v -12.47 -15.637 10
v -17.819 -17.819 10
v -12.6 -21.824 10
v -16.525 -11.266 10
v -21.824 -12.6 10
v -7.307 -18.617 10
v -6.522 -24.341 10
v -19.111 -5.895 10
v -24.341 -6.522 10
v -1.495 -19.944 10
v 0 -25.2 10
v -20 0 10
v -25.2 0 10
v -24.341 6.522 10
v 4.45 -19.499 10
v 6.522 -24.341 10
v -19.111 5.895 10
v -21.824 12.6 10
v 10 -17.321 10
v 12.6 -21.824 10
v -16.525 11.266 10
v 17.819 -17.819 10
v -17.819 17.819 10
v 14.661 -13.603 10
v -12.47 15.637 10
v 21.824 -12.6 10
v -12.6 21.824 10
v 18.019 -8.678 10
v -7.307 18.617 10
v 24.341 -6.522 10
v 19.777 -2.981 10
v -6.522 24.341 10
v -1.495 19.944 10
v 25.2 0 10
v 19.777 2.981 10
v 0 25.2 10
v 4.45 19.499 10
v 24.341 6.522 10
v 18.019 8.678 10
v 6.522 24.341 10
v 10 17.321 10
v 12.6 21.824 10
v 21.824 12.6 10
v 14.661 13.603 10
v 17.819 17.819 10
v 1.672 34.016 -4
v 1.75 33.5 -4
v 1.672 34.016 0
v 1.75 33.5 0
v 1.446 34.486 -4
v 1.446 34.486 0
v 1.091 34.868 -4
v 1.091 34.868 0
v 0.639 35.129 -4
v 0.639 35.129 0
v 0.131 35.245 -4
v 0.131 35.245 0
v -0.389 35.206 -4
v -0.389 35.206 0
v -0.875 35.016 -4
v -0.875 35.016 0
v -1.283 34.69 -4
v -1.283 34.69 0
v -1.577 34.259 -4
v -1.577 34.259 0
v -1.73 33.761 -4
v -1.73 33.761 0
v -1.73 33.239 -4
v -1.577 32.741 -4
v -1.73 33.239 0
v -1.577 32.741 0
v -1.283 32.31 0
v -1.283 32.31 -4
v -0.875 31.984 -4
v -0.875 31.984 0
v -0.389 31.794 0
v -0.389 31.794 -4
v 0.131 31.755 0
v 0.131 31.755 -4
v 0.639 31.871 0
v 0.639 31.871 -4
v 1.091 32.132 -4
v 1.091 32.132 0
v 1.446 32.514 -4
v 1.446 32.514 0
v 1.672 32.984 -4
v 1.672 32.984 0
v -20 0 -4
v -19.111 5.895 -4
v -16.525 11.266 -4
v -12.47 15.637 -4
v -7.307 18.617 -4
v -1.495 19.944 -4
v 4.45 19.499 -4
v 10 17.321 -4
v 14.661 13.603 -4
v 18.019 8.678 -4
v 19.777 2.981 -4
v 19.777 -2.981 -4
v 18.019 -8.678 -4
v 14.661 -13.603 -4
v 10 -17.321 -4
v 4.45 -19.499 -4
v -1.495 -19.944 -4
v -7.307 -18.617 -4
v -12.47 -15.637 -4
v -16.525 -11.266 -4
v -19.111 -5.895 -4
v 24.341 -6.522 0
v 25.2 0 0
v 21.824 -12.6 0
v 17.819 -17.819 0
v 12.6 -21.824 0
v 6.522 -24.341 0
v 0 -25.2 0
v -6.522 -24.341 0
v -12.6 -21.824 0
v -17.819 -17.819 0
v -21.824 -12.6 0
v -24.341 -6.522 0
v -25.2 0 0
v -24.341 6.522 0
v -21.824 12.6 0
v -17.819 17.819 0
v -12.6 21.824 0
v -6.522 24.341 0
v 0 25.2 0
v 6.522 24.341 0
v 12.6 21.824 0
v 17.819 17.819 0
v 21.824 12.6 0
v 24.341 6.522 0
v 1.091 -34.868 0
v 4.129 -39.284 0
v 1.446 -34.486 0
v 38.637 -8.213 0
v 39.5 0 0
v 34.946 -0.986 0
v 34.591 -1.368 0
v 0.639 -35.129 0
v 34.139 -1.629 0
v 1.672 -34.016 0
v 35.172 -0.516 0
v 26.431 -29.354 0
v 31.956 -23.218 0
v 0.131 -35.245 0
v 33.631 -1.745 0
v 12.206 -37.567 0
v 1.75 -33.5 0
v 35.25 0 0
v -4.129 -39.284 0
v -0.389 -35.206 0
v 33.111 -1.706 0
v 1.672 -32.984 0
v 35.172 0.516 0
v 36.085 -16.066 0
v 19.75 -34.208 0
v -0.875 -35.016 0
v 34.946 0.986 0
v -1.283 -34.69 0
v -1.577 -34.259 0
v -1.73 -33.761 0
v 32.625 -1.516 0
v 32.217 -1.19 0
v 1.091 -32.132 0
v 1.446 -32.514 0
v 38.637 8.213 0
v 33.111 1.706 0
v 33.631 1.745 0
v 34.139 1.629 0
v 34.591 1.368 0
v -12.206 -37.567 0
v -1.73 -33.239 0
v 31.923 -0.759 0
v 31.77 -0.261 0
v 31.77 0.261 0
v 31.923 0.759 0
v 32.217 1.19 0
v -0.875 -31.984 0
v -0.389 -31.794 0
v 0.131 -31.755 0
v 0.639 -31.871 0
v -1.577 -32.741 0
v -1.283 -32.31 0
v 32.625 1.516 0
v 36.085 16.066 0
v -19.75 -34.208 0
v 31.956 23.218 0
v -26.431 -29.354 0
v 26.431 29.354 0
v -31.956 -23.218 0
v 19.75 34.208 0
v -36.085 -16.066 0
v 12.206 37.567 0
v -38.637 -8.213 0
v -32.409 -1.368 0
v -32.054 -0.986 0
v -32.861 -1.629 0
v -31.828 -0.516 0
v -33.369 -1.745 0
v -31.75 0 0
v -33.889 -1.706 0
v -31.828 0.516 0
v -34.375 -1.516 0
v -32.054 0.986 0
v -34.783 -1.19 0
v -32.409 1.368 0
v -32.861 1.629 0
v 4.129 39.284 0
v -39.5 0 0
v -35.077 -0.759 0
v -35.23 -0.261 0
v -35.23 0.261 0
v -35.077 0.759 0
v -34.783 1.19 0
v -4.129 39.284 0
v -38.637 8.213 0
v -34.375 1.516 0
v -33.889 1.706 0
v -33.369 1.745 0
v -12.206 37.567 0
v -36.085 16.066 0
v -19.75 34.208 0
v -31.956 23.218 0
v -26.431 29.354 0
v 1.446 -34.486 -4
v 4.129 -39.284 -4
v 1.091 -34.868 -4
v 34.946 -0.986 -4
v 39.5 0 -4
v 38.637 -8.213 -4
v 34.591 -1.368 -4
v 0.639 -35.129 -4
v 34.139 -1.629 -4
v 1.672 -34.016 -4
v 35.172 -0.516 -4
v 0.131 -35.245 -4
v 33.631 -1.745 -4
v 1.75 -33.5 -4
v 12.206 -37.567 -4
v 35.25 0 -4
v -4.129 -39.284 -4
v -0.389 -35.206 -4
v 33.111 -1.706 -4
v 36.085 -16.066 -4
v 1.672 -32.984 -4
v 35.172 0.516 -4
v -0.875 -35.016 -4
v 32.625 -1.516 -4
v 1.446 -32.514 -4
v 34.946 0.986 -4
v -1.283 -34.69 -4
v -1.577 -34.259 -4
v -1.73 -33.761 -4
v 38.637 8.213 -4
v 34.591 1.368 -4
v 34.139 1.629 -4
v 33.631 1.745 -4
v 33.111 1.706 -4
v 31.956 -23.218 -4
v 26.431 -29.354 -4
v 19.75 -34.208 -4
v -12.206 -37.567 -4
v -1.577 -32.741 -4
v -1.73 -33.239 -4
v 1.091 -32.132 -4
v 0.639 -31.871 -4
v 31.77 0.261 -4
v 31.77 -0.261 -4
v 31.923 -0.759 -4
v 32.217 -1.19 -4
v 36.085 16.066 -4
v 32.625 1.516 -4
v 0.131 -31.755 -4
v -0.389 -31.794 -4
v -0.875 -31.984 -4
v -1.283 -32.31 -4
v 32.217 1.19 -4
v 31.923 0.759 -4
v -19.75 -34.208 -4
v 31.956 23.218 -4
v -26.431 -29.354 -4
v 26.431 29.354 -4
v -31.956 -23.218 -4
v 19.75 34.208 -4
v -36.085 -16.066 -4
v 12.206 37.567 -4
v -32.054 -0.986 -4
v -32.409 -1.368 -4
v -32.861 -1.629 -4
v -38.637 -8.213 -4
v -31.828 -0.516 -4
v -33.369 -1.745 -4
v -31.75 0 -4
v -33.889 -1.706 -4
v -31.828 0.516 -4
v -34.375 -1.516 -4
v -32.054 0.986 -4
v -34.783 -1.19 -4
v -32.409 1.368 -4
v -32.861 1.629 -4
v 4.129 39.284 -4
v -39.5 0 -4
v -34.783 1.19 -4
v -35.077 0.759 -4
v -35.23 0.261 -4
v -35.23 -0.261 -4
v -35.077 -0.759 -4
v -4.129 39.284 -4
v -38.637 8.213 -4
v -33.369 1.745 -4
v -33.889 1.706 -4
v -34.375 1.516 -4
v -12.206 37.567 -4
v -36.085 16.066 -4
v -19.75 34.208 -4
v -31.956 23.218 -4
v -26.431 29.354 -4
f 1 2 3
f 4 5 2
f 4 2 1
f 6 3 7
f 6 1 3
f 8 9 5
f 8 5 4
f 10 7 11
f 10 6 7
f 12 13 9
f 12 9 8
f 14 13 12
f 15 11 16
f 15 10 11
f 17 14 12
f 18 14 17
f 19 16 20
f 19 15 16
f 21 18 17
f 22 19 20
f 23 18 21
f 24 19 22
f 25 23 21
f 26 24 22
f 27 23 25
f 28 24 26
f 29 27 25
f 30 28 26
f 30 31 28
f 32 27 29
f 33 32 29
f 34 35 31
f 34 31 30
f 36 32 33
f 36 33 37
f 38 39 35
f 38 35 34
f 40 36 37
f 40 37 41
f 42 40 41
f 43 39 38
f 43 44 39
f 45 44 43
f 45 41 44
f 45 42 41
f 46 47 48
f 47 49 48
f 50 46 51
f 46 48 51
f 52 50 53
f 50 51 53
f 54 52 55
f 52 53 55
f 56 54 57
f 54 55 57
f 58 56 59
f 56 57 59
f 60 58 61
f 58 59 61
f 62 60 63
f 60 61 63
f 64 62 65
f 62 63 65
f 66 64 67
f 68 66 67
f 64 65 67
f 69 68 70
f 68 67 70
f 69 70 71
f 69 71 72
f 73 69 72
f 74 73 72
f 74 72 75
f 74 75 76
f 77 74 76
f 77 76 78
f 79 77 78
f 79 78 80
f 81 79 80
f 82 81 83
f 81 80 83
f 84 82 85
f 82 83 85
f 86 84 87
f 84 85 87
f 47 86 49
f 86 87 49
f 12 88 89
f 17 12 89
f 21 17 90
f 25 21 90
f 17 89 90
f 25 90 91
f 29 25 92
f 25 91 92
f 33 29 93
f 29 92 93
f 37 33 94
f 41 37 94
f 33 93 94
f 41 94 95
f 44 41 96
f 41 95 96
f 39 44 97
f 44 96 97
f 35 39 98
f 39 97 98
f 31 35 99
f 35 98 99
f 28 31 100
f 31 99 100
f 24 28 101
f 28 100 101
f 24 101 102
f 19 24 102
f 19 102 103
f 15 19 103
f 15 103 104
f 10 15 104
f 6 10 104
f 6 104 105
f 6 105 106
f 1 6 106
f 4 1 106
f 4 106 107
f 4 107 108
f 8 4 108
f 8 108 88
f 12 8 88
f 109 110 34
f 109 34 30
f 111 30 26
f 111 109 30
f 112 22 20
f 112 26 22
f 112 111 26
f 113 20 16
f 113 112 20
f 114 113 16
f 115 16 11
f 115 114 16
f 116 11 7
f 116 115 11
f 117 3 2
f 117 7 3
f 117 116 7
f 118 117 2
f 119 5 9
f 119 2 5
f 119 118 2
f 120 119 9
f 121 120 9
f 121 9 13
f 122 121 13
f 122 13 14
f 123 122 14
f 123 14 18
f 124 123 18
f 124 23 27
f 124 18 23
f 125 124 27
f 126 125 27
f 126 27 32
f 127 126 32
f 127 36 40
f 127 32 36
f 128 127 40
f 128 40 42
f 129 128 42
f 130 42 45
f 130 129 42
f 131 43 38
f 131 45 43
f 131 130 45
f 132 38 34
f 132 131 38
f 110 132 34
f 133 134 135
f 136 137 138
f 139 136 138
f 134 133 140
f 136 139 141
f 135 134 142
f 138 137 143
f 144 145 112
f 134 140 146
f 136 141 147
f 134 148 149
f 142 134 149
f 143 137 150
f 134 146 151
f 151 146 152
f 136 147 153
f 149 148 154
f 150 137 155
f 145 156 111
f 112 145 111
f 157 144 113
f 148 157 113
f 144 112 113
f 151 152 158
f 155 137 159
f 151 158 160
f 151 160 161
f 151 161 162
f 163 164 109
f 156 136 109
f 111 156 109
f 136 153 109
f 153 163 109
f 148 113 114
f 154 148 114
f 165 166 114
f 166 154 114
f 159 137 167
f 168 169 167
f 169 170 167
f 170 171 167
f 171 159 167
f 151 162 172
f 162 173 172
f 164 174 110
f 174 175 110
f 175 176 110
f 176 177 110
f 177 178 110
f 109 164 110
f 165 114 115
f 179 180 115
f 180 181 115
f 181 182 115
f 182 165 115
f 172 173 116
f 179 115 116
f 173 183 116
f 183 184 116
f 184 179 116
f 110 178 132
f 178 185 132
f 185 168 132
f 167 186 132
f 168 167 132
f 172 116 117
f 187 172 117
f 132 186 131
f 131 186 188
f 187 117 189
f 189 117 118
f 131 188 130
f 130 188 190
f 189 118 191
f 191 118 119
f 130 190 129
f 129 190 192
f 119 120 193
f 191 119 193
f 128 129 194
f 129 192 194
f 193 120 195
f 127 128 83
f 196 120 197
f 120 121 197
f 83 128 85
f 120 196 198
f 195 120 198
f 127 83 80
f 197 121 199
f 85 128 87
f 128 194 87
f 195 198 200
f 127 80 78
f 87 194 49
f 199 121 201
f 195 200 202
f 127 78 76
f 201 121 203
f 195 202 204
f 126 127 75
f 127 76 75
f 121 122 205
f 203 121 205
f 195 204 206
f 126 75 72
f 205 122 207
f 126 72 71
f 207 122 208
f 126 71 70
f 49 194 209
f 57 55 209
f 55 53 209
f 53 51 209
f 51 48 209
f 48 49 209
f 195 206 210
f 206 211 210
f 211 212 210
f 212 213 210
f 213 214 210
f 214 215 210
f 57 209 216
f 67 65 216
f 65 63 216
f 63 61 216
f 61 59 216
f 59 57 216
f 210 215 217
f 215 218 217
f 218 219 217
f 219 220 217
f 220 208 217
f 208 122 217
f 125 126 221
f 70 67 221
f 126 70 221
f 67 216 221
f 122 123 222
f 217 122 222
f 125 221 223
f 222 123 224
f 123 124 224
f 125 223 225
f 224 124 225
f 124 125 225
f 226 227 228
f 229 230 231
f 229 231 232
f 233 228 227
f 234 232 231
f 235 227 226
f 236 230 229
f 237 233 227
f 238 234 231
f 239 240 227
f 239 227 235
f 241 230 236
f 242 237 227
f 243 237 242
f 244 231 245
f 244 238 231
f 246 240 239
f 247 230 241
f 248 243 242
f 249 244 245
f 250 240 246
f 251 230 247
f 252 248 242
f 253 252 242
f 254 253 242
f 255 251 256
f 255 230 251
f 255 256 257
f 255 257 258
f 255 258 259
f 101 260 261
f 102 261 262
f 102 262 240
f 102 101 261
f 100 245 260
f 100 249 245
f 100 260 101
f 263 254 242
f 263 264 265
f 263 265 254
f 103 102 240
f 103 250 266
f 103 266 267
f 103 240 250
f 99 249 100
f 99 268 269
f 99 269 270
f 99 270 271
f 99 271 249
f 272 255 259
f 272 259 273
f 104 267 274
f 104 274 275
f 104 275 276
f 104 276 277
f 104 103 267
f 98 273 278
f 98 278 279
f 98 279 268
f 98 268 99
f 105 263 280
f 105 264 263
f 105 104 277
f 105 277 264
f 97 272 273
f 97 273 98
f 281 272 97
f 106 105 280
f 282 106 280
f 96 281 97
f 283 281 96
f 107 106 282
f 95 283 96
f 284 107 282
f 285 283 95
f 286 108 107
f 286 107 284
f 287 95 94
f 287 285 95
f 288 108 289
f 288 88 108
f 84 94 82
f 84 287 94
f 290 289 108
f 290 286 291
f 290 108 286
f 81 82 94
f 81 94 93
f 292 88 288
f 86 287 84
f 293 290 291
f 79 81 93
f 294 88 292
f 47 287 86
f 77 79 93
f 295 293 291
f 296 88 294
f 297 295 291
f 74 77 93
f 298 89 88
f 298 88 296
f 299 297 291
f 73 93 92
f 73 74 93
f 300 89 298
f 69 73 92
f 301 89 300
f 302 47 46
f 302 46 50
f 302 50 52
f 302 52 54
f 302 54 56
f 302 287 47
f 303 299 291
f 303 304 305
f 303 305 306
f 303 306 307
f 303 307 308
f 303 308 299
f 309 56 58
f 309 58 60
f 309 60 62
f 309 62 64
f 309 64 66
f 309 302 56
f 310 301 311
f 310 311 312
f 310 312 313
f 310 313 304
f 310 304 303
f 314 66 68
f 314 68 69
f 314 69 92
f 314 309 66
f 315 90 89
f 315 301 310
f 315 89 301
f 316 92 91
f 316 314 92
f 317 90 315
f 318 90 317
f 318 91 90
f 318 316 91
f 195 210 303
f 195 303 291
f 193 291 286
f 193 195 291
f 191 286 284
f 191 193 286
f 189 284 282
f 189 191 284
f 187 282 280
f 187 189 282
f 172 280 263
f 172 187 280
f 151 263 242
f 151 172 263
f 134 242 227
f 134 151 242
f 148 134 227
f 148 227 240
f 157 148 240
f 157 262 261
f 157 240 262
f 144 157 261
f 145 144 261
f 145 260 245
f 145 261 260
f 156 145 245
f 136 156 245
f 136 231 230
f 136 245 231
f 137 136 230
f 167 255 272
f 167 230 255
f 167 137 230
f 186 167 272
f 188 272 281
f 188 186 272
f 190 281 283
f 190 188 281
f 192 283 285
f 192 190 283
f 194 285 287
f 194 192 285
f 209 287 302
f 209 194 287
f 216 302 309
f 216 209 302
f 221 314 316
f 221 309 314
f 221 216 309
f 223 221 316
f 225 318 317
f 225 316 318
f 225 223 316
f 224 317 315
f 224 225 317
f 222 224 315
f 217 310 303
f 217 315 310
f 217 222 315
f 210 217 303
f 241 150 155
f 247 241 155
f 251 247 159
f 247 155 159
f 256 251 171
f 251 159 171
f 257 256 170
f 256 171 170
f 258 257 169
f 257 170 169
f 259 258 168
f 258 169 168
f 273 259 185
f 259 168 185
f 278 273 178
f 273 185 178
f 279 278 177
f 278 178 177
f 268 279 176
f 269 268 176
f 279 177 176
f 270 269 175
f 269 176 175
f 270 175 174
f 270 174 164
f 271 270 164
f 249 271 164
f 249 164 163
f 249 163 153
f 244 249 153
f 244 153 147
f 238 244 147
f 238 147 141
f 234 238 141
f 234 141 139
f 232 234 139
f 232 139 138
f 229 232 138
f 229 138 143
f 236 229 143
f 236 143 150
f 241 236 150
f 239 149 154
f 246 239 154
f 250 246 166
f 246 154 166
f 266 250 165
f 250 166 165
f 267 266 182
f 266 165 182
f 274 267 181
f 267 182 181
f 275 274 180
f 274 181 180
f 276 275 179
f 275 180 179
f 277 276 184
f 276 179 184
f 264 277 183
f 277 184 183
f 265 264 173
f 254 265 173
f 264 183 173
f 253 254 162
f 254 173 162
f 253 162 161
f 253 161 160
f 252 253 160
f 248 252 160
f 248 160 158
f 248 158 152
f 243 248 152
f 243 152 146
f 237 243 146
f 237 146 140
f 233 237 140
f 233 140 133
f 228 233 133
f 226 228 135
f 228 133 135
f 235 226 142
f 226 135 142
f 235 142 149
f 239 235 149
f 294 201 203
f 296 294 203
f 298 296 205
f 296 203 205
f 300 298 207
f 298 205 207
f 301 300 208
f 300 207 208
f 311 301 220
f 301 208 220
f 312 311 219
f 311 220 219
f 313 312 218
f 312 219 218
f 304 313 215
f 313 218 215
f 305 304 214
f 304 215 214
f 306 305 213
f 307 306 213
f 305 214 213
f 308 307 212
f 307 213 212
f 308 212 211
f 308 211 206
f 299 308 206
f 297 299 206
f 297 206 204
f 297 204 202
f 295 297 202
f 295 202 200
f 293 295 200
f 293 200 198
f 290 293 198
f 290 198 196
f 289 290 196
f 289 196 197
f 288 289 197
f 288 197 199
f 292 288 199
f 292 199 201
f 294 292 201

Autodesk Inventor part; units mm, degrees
ref_plane "YZ Plane" through (0, 0, 0) normal (1, 0, 0) x (0, 1, 0)
ref_plane "XZ Plane" through (0, 0, 0) normal (0, 1, 0) x (-1, 0, 0)
ref_plane "XY Plane" through (0, 0, 0) normal (0, 0, 1) x (1, 0, 0)
sketch "Sketch1" plane through (0, 0, 0) normal (0, 0, 1) x (1, 0, 0)
  circle A0 centre (0, 0) radius 25.2
  dimension "d0" = 50.4
extrude "Extrusion1" add sketch "Sketch1" along normal blind 10
sketch "Sketch2" plane through (0, 0, 10) normal (0, 0, 1) x (1, 0, 0)
  circle A0 centre (0, 0) radius 25.2 projected
  circle A1 centre (0, 0) radius 7
  dimension "d3" = 14
extrude "Extrusion2" add sketch "Sketch2" along normal blind 6 contours A1
sketch "Sketch3" plane through (0, 0, 0) normal (0, 0, -1) x (-1, 0, 0)
  circle A0 centre (0, 0) radius 7 projected
  circle A1 centre (0, 0) radius 39.5
  dimension "d6" = 79
extrude "Extrusion3" add sketch "Sketch3" along normal blind 4 contours A0 | A1
sketch "Sketch4" plane through (0, 0, 16) normal (0, 0, 1) x (1, 0, 0)
  circle A0 centre (0, 0) radius 7 projected
  circle A1 centre (0, 0) radius 4
  dimension "d9" = 8
extrude "Extrusion4" cut sketch "Sketch4" against normal through all contours A1
sketch "Sketch5" plane through (0, 0, 0) normal (0, 0, 1) x (1, 0, 0)
  circle A0 centre (0, 0) radius 4 projected
  line L0 (0, 0) -> (0, 39.5)
  circle A1 centre (0, 0) radius 39.5 projected
  line L1 (0, 0) -> (0, -39.5)
  circle A2 centre (0, 0) radius 39.5 projected
  circle A3 centre (0, 0) radius 4 projected
  line L2 (0, 0) -> (38.7035, 0)
  circle A4 centre (0, 0) radius 7 projected
  line L3 (0, 0) -> (-39.5, 0)
  circle A5 centre (0, 0) radius 7 projected
  circle A6 centre (0, -33.5) radius 1.75
  circle A7 centre (33.5, 0) radius 1.75
  circle A8 centre (0, 33.5) radius 1.75
  circle A9 centre (-33.5, 0) radius 1.75
  circle A10 centre (0, 0) radius 33.5
  dimension "d13" = 3.5
  dimension "d19" = 67
extrude "Extrusion5" cut sketch "Sketch5" against normal through all contours A7 A10 L2 | L2 A10 A7 | A8 A10 L0 | L0 A10 A8 | A6 A10 L1 | L1 A10 A6 | A10 A7 L2 | L2 A7 A10 | A9 A10 L3 | L3 A10 A9 | A10 A8 L0 | L0 A8 A10 | A10 A6 L1 | L1 A6 A10 | A10 A9 L3 | L3 A9 A10
sketch "Sketch7" plane through (0, 0, -4) normal (0, 0, -1) x (-1, 0, 0)
  circle A0 centre (0, 0) radius 20
  dimension "d20" = 40
extrude "Extrusion7" cut sketch "Sketch7" against normal blind 75
properties part number "2209_Tube Flange_V1" material "ABS Plastic"
